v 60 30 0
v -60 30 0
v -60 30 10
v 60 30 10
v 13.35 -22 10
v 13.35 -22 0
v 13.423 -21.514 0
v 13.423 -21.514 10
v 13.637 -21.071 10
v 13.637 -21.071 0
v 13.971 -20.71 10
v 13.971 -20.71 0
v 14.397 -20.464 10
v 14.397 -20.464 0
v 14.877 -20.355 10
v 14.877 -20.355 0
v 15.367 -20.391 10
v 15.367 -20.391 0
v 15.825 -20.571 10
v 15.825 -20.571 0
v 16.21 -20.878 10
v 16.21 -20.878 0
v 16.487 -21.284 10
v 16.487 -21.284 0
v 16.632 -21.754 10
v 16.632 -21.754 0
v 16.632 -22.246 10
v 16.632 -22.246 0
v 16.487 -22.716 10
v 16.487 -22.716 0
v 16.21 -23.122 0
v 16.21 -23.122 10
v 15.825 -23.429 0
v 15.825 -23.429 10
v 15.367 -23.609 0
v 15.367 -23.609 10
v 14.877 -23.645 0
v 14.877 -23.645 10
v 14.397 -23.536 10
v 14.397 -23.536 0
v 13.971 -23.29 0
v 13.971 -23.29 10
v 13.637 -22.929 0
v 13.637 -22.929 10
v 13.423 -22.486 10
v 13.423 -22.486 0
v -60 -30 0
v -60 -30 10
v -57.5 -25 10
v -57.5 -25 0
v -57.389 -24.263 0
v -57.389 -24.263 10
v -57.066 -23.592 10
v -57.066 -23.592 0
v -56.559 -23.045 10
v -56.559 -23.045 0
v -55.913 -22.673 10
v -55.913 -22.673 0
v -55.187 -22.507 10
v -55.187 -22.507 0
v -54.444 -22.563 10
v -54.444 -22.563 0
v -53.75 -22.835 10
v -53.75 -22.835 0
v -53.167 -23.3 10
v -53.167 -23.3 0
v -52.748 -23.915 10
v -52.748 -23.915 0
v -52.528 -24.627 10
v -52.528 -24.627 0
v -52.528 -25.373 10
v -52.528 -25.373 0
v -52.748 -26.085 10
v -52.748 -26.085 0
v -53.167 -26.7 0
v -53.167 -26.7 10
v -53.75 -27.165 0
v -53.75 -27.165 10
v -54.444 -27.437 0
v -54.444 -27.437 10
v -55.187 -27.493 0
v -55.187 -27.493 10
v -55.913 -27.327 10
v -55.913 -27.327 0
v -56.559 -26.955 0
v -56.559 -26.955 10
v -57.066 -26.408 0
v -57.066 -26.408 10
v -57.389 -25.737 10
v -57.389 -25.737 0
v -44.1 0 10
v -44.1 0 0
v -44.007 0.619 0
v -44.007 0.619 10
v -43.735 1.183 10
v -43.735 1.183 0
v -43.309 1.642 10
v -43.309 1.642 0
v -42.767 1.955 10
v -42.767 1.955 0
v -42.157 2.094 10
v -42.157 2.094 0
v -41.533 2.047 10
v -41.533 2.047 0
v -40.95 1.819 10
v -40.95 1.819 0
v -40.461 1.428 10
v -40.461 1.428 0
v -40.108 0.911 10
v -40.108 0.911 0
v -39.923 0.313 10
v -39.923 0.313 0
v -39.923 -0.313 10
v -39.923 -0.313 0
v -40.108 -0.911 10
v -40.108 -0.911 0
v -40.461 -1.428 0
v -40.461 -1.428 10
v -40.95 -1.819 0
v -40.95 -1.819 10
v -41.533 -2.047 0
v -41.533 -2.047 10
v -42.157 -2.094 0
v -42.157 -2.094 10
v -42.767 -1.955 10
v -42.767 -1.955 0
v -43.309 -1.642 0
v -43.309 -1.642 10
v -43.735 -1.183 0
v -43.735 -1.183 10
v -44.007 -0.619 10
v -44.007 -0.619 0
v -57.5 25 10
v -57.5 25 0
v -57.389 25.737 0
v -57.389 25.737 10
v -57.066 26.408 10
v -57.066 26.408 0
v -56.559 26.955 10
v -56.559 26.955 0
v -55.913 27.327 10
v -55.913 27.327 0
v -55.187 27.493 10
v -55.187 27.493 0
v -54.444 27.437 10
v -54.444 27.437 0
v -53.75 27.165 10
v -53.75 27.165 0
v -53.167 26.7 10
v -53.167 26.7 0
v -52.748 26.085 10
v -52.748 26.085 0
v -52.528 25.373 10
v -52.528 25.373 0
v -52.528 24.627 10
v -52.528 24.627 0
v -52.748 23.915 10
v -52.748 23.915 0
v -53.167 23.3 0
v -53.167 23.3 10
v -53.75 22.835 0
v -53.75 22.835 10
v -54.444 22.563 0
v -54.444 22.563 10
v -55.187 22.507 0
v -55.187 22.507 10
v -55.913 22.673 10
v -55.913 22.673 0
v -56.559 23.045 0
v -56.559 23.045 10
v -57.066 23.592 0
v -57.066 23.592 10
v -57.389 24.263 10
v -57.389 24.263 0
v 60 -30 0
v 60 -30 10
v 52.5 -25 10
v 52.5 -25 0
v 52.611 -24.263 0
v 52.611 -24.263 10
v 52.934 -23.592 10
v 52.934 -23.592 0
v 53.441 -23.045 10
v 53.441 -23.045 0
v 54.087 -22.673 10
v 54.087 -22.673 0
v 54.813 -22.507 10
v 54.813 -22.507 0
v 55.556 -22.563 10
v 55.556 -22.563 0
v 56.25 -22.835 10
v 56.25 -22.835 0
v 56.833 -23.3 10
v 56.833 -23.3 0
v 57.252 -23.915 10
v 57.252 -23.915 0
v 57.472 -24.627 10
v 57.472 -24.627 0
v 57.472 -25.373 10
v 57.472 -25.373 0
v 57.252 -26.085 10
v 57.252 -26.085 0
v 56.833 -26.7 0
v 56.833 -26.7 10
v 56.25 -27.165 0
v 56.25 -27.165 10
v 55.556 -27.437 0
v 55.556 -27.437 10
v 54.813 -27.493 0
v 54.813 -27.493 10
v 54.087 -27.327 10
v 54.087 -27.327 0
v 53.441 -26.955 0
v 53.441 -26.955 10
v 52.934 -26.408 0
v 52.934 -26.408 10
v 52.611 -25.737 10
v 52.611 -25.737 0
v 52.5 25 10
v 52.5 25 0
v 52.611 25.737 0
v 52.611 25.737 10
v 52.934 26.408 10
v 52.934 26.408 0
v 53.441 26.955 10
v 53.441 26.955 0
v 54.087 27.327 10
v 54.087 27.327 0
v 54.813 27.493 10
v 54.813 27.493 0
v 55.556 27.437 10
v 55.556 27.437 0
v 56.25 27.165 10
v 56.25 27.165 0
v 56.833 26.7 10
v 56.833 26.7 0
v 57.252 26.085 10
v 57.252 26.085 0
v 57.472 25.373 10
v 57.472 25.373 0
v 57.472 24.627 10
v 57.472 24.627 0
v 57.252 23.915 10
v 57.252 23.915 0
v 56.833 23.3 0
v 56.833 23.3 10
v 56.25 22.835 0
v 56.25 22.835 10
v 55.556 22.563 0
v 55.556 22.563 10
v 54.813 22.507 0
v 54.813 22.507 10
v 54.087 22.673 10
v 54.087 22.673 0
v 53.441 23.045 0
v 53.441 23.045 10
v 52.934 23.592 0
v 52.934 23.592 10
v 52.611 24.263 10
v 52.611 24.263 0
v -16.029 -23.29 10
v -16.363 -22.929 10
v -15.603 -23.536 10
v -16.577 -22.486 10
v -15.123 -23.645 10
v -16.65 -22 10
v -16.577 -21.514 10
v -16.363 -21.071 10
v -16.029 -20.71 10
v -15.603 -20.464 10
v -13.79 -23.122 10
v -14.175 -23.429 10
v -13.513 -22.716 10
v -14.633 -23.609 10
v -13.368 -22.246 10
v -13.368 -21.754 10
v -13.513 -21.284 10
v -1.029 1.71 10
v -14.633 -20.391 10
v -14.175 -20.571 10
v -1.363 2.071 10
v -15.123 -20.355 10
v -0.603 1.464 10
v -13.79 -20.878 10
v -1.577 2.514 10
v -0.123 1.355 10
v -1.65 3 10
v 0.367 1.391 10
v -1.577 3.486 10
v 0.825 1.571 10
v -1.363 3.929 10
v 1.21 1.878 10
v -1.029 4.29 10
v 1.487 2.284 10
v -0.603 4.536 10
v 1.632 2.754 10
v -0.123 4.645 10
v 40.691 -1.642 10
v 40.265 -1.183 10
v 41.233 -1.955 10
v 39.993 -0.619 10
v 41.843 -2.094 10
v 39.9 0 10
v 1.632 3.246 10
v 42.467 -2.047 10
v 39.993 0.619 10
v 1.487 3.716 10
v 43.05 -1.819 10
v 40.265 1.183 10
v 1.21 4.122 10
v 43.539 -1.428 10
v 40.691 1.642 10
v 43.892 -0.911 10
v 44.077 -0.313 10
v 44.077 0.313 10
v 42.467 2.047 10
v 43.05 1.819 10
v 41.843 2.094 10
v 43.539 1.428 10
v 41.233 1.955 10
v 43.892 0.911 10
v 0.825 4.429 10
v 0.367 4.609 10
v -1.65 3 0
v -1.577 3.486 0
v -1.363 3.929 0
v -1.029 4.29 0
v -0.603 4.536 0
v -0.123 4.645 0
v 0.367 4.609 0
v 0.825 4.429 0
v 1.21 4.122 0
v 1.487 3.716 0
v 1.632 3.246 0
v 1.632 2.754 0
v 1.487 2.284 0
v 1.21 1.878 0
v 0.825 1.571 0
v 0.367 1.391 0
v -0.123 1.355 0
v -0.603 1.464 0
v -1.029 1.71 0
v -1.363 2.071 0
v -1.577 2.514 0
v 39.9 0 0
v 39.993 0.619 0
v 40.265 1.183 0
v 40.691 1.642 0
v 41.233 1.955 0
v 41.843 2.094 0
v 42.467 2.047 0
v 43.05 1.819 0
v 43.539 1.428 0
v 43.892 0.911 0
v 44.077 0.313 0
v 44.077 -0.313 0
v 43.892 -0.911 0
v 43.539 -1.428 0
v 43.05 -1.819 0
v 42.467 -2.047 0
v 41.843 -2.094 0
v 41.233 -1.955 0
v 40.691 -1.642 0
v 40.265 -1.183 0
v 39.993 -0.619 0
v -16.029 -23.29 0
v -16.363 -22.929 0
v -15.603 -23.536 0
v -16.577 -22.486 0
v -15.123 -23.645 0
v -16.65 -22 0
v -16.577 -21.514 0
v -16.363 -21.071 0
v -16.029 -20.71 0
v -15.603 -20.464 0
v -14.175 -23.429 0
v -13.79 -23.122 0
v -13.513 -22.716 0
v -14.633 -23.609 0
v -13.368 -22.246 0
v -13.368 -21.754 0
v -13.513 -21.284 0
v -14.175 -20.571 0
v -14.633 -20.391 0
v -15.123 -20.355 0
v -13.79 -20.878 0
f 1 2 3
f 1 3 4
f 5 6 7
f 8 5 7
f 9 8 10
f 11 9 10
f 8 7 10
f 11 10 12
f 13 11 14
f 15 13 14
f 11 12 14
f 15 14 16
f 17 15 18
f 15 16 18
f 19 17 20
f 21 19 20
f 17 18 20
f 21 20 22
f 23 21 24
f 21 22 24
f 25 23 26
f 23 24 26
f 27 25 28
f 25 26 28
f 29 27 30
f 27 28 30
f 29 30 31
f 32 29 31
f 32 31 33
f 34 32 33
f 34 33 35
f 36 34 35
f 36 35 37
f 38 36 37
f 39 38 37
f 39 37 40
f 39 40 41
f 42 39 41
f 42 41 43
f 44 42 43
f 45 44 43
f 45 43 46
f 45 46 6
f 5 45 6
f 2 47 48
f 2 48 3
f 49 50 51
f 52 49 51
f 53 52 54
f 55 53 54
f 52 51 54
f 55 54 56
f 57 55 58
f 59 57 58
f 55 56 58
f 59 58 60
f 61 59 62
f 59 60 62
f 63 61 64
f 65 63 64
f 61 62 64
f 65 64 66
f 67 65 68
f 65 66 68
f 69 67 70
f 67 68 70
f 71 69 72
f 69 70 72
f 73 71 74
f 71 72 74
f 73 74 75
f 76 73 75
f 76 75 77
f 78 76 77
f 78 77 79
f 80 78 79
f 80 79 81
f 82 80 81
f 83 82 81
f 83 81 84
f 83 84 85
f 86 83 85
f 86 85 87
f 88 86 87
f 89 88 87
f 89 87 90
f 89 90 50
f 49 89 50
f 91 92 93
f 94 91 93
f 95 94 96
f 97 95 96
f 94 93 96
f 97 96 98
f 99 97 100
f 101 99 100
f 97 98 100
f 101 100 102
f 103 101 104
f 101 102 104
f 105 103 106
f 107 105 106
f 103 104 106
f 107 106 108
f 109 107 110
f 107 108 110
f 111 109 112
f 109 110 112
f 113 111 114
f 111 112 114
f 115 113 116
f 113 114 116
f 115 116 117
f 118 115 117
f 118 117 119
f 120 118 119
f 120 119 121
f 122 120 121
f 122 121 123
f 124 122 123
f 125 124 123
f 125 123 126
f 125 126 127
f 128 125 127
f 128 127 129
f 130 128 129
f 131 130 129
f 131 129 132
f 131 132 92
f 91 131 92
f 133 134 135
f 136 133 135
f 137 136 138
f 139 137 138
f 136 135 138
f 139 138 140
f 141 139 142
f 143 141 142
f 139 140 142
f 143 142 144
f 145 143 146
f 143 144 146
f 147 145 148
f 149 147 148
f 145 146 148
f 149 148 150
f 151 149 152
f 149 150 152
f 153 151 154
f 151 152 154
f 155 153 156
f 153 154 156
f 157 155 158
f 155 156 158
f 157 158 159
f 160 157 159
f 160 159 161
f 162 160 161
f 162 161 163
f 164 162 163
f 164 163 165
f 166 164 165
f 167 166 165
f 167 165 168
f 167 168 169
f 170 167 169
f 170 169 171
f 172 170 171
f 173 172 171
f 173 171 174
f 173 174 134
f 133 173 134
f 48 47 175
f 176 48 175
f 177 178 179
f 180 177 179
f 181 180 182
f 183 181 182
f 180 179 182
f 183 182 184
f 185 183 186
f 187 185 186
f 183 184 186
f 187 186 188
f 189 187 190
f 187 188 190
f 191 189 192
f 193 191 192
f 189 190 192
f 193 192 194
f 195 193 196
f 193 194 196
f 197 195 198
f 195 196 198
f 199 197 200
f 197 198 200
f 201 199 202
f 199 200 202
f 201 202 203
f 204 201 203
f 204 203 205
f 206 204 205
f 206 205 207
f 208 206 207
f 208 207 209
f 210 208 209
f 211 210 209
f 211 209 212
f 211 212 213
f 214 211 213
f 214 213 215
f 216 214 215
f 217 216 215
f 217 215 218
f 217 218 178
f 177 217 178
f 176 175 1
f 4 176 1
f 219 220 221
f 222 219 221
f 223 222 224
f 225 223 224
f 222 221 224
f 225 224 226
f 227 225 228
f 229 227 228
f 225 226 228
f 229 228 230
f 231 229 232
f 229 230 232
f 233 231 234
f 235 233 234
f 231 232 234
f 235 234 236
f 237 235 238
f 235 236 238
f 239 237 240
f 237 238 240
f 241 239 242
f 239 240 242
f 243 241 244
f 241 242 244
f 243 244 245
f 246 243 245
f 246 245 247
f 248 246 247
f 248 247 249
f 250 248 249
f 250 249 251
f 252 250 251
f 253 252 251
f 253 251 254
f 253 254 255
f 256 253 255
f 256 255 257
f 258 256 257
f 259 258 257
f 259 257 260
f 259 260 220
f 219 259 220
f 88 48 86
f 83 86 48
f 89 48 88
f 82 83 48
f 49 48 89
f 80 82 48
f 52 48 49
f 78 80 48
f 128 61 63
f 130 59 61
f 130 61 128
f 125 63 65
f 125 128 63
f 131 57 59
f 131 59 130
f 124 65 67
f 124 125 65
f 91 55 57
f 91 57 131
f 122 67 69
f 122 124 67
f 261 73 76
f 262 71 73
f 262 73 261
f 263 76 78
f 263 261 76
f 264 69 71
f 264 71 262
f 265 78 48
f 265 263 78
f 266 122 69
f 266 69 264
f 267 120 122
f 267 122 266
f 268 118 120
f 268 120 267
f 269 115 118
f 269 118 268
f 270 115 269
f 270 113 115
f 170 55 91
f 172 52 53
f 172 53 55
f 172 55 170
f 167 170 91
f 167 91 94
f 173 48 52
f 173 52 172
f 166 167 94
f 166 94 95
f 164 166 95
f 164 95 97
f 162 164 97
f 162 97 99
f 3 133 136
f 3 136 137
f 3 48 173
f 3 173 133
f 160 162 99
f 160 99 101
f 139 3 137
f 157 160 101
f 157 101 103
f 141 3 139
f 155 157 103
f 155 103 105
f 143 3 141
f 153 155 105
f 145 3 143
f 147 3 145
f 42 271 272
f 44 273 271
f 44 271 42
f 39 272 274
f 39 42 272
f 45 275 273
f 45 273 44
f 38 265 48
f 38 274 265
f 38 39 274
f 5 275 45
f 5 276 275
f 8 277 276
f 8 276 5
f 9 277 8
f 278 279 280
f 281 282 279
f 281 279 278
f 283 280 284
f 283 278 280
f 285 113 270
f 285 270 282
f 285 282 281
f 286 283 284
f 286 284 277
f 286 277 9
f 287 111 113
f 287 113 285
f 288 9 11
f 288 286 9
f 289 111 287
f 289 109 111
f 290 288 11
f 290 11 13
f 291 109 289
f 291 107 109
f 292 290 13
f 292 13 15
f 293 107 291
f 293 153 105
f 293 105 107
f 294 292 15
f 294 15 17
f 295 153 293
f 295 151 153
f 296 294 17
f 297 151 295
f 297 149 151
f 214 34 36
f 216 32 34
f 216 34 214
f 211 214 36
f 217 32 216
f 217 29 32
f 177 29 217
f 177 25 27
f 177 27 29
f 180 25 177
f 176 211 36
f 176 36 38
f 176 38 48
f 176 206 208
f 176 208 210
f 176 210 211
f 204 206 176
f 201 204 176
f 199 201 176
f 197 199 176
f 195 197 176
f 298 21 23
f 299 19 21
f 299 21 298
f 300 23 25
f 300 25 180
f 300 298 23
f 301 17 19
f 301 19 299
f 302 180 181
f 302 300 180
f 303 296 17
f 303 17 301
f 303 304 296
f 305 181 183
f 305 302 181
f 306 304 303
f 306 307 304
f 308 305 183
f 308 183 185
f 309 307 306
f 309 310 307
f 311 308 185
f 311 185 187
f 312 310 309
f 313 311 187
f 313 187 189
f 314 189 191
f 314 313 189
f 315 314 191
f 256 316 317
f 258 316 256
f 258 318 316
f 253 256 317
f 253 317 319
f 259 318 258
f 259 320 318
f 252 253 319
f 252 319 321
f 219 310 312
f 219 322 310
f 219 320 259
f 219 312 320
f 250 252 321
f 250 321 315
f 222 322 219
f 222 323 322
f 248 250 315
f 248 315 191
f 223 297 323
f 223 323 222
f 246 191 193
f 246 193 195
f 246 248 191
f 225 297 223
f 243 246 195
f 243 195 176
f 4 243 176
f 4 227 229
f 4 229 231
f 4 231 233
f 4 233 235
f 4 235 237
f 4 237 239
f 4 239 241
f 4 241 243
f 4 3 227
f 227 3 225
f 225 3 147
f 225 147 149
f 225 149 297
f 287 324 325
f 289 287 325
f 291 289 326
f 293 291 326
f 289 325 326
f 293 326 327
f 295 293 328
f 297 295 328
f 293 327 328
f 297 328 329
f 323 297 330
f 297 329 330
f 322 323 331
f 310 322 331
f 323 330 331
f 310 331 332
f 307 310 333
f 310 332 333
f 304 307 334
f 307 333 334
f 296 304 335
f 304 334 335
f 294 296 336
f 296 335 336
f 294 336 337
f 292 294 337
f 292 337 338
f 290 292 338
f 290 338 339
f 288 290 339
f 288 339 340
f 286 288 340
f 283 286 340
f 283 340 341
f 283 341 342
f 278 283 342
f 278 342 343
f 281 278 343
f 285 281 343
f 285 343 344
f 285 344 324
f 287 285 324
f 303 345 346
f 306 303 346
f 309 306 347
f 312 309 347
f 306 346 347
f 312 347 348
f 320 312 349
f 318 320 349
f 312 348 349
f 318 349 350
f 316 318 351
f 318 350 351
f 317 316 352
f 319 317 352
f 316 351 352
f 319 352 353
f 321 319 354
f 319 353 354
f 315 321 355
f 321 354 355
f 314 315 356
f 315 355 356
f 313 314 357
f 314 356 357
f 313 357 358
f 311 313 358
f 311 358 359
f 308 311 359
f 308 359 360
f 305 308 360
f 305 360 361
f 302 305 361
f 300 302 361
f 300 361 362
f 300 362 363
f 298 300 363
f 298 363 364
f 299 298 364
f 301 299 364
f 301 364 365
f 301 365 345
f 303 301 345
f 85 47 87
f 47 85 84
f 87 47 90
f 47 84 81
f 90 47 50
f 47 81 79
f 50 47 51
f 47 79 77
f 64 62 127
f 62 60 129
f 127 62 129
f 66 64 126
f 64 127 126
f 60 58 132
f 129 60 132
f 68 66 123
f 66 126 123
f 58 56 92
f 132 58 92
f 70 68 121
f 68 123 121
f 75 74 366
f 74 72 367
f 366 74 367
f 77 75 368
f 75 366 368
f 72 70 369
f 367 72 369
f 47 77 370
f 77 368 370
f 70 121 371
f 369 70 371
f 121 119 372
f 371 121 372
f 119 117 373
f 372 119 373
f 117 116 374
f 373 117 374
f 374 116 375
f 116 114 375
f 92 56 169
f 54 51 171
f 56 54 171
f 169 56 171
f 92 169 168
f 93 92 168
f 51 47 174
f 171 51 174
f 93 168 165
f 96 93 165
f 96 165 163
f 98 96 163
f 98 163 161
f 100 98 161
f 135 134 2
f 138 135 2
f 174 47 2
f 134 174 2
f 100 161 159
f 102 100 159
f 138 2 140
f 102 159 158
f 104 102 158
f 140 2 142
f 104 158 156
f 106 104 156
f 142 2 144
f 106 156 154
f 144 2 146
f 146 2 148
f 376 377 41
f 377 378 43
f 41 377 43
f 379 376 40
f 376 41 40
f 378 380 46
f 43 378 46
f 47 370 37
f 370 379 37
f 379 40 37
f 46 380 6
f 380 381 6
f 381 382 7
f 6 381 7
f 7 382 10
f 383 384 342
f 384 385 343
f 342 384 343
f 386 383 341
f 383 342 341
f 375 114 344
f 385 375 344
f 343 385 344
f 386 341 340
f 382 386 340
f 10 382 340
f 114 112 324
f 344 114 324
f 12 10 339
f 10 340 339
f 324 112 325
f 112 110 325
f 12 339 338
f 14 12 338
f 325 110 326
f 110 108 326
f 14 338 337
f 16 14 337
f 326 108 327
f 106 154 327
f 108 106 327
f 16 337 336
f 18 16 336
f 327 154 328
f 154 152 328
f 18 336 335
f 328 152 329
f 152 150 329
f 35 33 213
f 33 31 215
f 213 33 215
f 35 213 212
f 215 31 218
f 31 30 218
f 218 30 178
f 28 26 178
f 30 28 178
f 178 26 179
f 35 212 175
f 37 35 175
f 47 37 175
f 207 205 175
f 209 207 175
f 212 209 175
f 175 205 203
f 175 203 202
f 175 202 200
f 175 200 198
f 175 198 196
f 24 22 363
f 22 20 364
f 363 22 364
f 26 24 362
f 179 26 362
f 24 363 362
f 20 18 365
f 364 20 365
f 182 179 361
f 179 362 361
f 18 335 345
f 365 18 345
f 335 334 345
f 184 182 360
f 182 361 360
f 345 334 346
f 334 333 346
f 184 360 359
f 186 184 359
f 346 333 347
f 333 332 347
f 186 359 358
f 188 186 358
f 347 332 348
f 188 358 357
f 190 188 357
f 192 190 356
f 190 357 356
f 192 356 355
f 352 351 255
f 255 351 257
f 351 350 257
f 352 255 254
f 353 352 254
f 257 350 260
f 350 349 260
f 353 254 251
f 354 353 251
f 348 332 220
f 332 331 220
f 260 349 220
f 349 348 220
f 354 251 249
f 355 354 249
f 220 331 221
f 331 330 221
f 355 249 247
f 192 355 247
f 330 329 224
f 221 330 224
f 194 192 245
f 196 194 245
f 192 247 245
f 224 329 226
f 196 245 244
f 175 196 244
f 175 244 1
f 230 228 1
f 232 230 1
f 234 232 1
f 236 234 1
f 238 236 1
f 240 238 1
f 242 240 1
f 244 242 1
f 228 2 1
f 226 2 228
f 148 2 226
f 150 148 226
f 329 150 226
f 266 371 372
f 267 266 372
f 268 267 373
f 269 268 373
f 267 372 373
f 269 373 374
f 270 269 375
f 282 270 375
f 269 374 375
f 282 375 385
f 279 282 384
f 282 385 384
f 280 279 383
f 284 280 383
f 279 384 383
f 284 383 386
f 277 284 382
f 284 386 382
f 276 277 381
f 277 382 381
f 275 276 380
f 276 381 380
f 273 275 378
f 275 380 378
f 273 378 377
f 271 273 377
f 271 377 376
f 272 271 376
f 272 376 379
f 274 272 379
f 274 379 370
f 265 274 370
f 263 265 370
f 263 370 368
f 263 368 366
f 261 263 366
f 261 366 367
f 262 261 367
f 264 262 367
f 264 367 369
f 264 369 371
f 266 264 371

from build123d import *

# Parameters (mm, degrees)
SKIZZE1_W                       = 120
SKIZZE1_H                       = 60
AUFSATZ_LINEAR_AUSTRAGEN1_DEPTH = 10
M6_GEWINDEBOHRUNG1_D            = 5
M5_GEWINDEBOHRUNG1_D            = 4.2
M4_GEWINDEBOHRUNG1_D            = 3.3


with BuildPart() as part:
    # Skizze1 → Aufsatz-Linear austragen1 (new body)
    with BuildSketch(Plane.XY):
        Rectangle(SKIZZE1_W, SKIZZE1_H)
    extrude(amount=AUFSATZ_LINEAR_AUSTRAGEN1_DEPTH)

    # M6 Gewindebohrung1 (through all)
    with Locations(Plane.XY.offset(10)):
        with Locations((-55, -25), (-55, 25), (55, 25), (55, -25)):
            Hole(M6_GEWINDEBOHRUNG1_D / 2)

    # M5 Gewindebohrung1 (through all)
    with Locations(Plane.XY.offset(10)):
        with Locations((-42, 0), (42, 0)):
            Hole(M5_GEWINDEBOHRUNG1_D / 2)

    # M4 Gewindebohrung1 (through all)
    with Locations(Plane.XY.offset(10)):
        with Locations((0, 3), (-15, -22), (15, -22)):
            Hole(M4_GEWINDEBOHRUNG1_D / 2)


solid = part.part
